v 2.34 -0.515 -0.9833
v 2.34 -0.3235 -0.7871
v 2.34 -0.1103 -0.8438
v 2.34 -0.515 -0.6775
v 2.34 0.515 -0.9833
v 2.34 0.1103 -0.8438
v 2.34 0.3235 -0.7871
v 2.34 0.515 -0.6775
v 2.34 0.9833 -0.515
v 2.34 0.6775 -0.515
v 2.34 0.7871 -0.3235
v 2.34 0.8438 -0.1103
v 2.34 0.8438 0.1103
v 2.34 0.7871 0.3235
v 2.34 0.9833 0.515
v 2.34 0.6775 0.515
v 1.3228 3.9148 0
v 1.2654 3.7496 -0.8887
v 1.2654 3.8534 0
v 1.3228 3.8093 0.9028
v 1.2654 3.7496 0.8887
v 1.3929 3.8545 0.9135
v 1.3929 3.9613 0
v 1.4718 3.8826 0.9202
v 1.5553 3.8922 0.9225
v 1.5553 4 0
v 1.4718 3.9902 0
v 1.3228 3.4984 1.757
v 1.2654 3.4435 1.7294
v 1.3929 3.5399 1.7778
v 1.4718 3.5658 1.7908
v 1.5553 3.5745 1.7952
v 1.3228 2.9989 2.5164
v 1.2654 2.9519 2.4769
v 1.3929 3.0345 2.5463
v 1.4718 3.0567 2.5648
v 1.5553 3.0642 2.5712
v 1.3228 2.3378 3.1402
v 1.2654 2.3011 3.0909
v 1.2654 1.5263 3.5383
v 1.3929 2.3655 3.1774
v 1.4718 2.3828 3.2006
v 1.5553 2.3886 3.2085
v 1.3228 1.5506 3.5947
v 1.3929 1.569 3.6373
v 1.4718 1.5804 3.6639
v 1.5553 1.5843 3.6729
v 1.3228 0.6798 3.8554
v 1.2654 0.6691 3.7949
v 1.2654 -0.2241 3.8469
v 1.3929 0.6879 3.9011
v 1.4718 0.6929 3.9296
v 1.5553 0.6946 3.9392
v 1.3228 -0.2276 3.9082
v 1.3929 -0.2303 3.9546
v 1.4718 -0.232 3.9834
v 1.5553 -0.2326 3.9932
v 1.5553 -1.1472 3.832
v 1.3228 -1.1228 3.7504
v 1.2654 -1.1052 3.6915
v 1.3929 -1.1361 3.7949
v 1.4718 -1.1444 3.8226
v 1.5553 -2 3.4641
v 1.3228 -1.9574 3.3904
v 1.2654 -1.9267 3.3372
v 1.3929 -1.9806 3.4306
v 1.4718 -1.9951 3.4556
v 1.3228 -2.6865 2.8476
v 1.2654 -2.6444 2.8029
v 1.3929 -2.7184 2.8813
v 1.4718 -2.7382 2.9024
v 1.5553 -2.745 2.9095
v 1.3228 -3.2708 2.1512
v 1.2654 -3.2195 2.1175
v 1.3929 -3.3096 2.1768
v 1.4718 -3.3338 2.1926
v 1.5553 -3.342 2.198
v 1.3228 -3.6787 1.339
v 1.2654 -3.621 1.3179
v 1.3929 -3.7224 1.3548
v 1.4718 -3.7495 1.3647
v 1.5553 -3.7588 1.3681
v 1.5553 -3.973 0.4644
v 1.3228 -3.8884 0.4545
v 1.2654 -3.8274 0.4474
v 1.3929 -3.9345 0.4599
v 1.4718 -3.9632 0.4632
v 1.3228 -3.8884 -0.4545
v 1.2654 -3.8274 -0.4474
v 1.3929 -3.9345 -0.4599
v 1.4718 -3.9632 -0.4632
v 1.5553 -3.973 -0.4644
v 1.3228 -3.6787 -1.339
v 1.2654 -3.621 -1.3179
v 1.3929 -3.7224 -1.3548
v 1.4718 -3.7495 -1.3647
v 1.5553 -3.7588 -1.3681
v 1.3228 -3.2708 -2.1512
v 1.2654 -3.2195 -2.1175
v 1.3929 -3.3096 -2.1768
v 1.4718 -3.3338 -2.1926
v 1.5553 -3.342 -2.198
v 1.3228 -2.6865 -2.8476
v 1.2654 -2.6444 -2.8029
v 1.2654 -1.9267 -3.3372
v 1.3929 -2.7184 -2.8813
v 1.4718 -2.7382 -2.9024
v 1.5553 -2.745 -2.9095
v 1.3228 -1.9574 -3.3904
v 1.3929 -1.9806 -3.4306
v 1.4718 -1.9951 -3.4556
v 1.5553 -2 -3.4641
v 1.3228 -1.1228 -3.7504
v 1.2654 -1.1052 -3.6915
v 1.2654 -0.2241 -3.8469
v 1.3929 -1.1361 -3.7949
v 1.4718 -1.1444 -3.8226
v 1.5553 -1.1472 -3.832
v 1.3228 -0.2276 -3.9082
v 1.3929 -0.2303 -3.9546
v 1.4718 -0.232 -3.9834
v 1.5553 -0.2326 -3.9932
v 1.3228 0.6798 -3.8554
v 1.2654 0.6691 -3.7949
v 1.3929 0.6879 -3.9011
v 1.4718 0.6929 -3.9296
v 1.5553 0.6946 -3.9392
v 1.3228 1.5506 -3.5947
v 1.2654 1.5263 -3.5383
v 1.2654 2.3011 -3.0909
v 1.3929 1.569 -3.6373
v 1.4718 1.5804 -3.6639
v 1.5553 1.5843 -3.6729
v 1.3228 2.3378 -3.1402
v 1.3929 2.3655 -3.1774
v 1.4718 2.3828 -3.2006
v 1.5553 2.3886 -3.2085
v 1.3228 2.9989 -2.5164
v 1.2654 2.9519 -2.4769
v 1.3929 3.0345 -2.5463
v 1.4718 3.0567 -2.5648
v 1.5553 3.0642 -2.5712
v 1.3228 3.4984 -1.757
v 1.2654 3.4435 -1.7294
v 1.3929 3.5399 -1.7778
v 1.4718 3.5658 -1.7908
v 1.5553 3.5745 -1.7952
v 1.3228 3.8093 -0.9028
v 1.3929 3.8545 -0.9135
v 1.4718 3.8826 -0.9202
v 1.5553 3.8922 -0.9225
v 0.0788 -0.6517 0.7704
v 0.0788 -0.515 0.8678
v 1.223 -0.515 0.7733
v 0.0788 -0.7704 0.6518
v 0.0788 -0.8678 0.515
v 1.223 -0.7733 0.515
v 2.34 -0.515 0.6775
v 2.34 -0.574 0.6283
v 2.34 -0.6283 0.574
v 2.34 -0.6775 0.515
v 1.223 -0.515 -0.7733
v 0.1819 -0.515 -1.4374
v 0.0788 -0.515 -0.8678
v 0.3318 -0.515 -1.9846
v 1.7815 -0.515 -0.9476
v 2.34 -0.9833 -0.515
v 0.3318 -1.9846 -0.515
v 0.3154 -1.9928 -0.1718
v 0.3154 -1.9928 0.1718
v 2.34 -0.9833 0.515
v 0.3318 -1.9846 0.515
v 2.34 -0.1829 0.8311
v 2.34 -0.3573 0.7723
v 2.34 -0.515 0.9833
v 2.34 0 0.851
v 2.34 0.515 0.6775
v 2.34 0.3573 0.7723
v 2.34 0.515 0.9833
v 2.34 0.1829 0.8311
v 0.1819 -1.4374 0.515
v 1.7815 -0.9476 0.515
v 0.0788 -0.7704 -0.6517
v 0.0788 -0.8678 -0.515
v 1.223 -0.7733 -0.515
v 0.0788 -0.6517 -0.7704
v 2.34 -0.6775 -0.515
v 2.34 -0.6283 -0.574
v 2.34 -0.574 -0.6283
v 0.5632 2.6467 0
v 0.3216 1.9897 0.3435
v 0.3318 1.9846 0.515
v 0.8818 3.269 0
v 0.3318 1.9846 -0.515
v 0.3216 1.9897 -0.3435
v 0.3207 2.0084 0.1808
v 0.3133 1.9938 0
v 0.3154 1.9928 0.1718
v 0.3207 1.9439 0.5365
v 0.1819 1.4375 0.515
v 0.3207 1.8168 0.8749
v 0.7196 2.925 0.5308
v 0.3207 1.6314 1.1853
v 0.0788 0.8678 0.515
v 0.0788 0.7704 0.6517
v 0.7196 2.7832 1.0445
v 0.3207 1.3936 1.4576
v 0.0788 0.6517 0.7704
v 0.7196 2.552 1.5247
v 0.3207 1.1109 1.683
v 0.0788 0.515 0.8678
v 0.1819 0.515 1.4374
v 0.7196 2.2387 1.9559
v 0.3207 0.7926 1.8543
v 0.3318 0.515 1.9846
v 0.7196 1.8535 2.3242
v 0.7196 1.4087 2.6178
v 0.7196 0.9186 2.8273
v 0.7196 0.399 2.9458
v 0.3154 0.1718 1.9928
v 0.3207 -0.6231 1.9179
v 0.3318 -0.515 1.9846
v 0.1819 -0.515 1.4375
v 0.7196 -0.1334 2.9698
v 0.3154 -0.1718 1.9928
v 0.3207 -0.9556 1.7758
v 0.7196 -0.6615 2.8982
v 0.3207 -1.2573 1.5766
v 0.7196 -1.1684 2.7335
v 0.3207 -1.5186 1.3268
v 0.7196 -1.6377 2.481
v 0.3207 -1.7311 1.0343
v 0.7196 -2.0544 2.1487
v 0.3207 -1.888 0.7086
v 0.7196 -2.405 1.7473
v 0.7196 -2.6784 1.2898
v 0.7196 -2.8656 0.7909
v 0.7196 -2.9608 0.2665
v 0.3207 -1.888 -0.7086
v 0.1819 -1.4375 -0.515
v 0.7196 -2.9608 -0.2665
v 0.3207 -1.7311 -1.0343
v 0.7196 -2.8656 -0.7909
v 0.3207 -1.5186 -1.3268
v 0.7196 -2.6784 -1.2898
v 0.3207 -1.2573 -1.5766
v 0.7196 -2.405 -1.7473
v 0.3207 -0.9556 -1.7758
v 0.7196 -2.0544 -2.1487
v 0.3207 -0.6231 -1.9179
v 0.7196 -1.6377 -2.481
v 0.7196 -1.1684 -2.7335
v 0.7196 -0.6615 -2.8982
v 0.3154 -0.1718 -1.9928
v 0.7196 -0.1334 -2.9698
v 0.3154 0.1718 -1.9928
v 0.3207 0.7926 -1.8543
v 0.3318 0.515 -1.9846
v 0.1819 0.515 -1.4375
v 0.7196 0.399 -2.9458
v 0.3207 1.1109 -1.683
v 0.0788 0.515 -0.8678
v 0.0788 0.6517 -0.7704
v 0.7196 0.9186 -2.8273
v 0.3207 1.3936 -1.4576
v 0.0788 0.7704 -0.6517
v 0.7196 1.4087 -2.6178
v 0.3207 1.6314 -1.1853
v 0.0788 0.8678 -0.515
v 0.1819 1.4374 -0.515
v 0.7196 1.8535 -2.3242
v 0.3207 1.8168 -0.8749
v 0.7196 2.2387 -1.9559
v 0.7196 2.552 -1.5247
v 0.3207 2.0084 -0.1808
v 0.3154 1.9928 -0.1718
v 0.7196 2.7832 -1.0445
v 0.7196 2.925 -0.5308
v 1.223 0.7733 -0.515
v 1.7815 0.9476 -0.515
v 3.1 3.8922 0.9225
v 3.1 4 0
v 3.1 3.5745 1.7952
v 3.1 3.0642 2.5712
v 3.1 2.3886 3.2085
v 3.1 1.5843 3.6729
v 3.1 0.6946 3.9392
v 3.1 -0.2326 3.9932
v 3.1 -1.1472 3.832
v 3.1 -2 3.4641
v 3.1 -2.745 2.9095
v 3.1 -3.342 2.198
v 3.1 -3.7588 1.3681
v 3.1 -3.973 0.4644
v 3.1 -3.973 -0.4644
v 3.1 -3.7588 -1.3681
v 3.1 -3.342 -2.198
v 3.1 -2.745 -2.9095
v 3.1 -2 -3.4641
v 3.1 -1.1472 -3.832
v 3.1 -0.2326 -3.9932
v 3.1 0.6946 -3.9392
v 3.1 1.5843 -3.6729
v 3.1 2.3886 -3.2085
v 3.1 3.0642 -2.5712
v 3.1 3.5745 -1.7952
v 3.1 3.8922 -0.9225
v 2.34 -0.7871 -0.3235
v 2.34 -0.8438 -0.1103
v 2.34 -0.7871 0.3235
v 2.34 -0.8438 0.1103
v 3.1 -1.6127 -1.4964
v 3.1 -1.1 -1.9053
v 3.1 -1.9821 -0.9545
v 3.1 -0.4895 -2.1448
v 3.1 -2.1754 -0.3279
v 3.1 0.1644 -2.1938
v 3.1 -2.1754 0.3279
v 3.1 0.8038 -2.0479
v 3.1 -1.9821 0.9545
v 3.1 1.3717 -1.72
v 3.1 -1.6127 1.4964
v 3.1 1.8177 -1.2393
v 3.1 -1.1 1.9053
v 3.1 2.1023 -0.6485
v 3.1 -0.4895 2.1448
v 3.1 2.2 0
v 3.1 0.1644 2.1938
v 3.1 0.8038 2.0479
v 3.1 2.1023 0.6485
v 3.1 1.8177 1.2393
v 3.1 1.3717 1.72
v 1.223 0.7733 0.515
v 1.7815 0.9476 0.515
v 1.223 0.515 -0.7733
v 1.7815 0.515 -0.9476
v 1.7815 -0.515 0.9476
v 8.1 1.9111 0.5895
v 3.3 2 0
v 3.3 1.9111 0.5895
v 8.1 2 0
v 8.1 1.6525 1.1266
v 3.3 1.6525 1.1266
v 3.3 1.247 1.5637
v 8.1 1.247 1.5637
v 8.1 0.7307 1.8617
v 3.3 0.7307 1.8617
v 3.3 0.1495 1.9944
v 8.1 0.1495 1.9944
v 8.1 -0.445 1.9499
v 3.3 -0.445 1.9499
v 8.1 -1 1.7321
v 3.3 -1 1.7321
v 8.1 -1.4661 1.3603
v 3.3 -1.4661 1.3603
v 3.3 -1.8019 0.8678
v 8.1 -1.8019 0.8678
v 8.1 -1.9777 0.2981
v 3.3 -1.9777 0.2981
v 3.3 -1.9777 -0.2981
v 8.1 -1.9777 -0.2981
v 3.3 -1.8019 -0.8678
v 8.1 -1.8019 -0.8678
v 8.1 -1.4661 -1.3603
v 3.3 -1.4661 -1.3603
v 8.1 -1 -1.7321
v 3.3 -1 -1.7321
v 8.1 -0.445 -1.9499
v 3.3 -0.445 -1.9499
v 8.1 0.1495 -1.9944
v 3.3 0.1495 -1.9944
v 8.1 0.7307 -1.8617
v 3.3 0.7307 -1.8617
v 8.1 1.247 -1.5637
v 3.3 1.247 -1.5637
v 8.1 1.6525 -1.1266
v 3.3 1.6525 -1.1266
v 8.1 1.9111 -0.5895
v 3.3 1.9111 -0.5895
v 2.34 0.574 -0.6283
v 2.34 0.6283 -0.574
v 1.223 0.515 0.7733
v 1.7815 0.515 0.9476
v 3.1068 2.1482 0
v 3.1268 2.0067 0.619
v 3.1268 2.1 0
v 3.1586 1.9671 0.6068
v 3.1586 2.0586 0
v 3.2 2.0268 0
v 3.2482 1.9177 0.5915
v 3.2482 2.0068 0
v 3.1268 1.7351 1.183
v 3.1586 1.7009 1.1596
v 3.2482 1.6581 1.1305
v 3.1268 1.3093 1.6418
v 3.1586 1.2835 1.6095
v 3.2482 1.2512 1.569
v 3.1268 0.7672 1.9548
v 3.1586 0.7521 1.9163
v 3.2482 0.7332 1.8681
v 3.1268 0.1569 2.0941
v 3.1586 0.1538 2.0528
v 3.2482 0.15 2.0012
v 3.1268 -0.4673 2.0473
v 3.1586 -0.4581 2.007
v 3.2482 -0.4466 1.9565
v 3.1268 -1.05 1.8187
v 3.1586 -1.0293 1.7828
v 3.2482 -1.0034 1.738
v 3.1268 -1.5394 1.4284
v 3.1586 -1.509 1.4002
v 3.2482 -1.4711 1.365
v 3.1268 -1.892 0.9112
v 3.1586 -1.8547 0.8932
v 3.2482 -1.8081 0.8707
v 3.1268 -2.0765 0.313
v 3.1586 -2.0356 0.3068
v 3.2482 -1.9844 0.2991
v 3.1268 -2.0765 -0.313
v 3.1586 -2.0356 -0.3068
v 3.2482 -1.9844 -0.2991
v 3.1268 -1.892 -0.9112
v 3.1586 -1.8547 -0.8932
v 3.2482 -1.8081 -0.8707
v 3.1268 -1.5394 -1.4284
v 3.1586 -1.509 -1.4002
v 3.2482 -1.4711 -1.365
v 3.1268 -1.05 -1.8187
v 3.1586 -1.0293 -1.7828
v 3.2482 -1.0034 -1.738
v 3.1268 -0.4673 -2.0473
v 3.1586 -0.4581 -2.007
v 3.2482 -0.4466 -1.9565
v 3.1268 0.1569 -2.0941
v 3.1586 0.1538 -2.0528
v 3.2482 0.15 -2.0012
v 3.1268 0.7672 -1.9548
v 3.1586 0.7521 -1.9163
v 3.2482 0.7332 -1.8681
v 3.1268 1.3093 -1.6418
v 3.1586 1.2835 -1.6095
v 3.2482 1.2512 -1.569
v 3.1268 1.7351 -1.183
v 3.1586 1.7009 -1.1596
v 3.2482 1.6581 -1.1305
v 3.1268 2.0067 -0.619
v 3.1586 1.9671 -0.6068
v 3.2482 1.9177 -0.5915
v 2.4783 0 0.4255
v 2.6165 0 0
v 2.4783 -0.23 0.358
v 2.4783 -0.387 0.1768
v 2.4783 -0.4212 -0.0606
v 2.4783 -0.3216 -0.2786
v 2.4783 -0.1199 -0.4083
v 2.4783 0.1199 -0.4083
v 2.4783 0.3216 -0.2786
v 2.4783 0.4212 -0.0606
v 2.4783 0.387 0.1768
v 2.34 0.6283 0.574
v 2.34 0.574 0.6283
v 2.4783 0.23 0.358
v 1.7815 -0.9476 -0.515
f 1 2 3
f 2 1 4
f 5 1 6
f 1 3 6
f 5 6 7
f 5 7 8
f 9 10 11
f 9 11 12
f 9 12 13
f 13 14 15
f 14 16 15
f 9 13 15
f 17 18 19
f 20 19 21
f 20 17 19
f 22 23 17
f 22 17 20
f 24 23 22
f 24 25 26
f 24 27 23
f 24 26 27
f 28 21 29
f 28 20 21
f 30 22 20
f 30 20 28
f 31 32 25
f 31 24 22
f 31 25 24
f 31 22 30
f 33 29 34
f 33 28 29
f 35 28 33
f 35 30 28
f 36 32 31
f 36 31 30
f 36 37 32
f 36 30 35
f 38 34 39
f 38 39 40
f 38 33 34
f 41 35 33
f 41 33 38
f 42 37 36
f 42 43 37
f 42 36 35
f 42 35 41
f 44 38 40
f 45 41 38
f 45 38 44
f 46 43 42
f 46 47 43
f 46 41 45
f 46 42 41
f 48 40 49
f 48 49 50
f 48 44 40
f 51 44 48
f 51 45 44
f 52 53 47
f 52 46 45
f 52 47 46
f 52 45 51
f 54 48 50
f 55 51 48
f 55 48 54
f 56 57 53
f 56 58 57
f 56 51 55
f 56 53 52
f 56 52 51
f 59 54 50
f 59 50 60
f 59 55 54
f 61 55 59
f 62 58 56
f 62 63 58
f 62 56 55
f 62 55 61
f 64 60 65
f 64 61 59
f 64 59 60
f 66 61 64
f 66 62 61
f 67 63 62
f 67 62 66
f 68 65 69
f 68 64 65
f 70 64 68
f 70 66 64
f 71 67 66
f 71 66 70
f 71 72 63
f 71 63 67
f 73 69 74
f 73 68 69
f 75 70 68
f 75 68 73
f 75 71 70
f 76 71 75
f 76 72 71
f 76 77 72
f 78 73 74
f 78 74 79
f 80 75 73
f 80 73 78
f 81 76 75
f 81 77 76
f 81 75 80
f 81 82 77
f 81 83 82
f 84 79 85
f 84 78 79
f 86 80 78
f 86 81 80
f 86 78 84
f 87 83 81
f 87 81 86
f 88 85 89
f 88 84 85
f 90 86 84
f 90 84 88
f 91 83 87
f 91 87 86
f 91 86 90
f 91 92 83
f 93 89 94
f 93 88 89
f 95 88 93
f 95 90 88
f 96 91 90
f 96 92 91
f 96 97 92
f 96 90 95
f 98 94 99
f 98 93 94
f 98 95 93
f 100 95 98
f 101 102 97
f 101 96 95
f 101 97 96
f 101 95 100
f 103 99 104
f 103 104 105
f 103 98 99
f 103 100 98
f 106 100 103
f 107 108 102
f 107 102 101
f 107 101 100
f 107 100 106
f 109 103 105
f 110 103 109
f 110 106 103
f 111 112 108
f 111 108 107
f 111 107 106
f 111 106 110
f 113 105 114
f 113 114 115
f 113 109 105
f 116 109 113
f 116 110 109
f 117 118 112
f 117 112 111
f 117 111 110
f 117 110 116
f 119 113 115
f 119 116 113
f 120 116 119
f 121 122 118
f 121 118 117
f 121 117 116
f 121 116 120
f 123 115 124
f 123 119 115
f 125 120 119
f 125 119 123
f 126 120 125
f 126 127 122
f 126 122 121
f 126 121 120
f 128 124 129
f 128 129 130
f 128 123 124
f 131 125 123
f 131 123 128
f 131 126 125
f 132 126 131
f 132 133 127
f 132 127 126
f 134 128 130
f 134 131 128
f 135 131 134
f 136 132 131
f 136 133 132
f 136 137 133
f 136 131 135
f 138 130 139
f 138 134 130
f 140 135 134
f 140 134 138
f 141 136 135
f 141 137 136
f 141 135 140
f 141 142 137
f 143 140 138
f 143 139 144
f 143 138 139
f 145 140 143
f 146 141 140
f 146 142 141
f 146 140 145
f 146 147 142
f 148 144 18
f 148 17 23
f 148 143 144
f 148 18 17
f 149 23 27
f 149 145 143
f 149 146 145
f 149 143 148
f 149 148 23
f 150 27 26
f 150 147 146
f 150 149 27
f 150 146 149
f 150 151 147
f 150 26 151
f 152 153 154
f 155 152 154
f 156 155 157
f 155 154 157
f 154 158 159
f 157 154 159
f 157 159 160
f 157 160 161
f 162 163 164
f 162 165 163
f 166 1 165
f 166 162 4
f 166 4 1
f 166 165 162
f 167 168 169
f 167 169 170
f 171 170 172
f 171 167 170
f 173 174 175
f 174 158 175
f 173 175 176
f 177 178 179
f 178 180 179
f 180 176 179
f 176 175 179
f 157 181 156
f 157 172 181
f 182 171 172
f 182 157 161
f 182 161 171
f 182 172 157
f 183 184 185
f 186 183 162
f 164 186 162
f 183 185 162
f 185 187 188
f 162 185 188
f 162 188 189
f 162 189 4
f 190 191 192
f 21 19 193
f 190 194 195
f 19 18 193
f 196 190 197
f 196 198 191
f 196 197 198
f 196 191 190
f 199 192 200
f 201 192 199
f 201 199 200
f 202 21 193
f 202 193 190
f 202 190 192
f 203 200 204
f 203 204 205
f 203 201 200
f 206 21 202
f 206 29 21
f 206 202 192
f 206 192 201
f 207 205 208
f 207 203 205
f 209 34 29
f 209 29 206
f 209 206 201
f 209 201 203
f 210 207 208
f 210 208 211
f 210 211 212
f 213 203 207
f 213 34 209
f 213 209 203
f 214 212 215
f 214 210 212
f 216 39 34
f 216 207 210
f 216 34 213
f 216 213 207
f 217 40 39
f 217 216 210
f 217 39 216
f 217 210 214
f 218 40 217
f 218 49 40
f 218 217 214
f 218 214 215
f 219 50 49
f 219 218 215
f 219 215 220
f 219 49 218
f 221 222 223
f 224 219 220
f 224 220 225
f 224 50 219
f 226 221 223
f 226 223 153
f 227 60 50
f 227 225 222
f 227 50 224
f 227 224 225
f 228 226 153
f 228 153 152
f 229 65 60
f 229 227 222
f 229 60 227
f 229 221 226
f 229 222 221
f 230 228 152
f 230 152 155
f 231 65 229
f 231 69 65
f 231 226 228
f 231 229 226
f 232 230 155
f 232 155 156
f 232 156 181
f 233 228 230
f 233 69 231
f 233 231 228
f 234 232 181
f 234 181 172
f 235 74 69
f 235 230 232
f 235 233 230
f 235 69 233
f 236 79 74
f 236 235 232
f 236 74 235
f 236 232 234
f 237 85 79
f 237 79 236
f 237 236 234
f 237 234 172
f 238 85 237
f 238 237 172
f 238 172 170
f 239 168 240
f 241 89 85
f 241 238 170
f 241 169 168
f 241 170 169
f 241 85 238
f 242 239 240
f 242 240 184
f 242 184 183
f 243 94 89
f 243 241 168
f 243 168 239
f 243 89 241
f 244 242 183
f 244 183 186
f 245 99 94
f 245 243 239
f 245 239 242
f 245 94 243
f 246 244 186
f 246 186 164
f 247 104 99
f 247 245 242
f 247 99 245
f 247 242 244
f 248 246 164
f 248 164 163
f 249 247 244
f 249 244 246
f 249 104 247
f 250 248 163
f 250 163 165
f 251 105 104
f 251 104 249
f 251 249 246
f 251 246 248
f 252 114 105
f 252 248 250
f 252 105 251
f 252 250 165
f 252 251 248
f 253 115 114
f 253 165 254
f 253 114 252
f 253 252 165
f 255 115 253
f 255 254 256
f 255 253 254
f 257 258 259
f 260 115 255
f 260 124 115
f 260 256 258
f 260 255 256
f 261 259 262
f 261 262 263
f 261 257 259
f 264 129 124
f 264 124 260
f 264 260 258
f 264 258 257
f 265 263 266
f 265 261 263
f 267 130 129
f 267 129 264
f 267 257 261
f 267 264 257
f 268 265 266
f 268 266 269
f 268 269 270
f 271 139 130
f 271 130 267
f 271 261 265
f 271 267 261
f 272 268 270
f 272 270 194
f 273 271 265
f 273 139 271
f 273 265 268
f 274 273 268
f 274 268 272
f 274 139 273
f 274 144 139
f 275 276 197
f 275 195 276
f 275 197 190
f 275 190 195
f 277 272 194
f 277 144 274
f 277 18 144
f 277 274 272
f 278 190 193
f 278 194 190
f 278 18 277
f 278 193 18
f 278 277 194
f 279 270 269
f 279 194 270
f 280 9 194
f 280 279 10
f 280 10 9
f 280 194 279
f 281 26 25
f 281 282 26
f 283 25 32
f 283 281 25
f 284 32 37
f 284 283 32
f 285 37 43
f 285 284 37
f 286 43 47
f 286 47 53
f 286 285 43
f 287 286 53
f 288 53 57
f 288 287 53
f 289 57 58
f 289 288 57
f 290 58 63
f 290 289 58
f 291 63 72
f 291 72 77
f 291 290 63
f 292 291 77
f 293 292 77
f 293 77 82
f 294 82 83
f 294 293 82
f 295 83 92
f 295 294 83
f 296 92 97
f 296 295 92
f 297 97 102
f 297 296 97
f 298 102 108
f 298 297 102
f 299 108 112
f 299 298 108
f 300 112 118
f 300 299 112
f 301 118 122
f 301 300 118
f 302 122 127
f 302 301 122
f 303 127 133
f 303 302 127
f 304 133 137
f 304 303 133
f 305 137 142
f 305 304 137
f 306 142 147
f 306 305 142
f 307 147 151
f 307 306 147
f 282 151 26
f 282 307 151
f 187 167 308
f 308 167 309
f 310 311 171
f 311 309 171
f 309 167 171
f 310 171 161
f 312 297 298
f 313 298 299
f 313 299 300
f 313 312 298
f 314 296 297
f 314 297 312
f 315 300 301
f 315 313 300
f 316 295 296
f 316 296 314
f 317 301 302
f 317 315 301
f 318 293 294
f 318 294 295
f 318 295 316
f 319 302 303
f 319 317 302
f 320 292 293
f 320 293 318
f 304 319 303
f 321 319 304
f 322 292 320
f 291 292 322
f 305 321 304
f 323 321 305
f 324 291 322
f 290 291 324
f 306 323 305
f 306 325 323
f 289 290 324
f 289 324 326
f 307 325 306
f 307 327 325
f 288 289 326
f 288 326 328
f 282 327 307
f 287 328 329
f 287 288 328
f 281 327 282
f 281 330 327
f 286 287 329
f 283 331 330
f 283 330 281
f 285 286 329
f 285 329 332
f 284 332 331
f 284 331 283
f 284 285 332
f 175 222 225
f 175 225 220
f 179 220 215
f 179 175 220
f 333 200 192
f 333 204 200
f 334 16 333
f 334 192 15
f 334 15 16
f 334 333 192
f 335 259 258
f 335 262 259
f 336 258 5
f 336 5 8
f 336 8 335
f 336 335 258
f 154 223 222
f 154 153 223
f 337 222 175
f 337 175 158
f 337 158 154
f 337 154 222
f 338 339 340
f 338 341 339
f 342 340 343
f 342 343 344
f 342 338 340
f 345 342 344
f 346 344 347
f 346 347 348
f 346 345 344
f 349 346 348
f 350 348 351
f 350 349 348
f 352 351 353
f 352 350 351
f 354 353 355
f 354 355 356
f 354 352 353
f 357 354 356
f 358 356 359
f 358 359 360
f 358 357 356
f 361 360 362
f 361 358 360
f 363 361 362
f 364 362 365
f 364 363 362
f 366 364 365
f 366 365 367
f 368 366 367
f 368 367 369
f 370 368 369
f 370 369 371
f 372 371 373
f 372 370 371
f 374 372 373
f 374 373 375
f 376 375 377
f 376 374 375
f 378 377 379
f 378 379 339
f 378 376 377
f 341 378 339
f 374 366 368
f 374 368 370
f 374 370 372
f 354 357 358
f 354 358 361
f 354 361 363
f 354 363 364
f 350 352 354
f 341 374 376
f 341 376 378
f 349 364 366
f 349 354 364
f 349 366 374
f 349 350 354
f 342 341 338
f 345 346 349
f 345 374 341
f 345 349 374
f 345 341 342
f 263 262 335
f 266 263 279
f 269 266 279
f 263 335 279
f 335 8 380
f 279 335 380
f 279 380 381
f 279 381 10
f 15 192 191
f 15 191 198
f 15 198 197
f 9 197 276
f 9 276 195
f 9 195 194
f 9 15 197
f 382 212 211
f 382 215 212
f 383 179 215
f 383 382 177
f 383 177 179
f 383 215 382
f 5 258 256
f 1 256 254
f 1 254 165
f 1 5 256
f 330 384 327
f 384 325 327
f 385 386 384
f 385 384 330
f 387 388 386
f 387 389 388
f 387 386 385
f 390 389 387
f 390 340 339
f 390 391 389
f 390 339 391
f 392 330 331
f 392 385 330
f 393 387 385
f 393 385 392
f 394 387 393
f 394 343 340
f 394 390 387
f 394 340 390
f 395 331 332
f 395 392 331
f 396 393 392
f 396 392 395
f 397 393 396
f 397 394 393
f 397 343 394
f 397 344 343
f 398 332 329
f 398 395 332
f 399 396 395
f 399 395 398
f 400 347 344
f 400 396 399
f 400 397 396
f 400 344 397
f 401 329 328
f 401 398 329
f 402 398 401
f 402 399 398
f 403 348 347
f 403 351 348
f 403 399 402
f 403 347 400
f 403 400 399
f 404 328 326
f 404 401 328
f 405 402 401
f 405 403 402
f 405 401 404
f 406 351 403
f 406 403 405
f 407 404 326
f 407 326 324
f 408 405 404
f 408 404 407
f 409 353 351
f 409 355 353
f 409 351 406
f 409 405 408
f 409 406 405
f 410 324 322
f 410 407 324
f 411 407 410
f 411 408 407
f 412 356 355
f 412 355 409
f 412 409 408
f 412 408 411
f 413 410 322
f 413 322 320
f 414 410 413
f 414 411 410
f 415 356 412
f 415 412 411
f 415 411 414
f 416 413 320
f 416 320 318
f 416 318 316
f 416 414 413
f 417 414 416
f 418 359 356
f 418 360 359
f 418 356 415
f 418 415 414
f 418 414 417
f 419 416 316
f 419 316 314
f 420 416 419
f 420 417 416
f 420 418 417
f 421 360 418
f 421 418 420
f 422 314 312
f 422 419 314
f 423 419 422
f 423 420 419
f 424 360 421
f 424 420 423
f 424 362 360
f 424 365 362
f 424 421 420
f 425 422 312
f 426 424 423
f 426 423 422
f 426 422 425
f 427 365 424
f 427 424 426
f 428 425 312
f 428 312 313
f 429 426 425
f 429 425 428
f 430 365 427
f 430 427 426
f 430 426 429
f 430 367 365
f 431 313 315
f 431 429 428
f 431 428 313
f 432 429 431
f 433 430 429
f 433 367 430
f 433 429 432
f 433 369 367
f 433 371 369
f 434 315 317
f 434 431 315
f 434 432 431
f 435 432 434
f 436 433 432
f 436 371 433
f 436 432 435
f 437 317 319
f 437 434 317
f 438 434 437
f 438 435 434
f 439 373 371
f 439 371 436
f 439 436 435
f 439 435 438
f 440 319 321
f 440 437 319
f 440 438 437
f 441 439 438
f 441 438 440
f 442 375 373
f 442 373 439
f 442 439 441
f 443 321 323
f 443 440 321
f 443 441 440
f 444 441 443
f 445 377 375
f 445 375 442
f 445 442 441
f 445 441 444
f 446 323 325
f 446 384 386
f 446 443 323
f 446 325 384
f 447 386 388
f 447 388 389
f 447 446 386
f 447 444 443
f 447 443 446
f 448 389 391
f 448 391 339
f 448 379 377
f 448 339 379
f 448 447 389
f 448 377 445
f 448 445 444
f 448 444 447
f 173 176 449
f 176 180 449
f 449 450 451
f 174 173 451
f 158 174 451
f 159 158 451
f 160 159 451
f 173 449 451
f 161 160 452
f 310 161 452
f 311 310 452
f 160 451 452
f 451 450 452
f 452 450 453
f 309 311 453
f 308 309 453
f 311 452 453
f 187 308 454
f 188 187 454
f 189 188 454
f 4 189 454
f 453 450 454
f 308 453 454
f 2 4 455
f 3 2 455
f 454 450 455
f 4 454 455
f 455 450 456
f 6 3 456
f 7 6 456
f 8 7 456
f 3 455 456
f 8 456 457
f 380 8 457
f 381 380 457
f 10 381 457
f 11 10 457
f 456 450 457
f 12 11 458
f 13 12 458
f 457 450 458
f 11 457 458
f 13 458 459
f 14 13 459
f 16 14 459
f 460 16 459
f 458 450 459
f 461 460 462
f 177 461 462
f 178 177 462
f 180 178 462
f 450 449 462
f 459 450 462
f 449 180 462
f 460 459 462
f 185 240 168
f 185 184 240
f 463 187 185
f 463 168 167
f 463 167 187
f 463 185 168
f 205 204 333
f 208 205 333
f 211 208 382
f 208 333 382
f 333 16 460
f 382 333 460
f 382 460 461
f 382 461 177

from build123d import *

# Parameters (mm, degrees)
RECPAT_COUNT = 2
RECPAT_ANGLE = 90


with BuildPart() as part:
    # Fillet1: read off the stored shape, not the designer's step
    # Fillet1 outline → Fillet1 (revolve)
    with BuildSketch(Plane.YX):
        with BuildLine():
            Line((2, 3.3), (2, 8.1))
            Line((2, 8.1), (0, 8.1))
            Line((0, 8.1), (0, 0))
            ThreePointArc((0, 0), (2.027933458, 0.324444488), (3.853420198, 1.265388956))
            ThreePointArc((3.853420198, 1.265388956), (3.961271902, 1.392873227), (4, 1.555305874))
            Line((4, 1.555305874), (4, 3.1))
            Line((4, 3.1), (2.2, 3.1))
            ThreePointArc((2.2, 3.1), (2.058578644, 3.158578644), (2, 3.3))
        make_face()
    revolve(axis=Axis((0, 0, 0), (1, 0, 0)))

    # Sketch3 → Recess section 0
    with BuildSketch(Plane(origin=(0, 0, 0), x_dir=(0, 0, -1), z_dir=(1, 0, 0))):
        with BuildLine():
            Line((0.515, -2.15), (-0.515, -2.15))
            Line((-0.515, -2.15), (-0.515, 2.15))
            Line((-0.515, 2.15), (0.515, 2.15))
            Line((0.515, 2.15), (0.515, -2.15))
        make_face()
    # Sketch4 → Recess section 1
    with BuildSketch(Plane(origin=(2.34, 0, 0), x_dir=(0, 0, -1), z_dir=(1, 0, 0))):
        with BuildLine():
            Line((0.515, -0.983319232), (-0.515, -0.983319232))
            Line((-0.515, -0.983319232), (-0.515, 0.983319232))
            Line((-0.515, 0.983319232), (0.515, 0.983319232))
            Line((0.515, 0.983319232), (0.515, -0.983319232))
        make_face()
    recess = loft(mode=Mode.SUBTRACT)

    # RecPat: Recess ×2 about axis
    recpat_axis = Axis((0, 0, 0), (1, 0, 0))
    for i in range(1, RECPAT_COUNT):
        add(recess.rotate(recpat_axis, i * RECPAT_ANGLE / (RECPAT_COUNT - 1)), mode=Mode.SUBTRACT)

    # RecCorSke → RecessCore (revolve, cut)
    with BuildSketch(Plane.XY, mode=Mode.PRIVATE) as recesscore_sk:
        Polygon((0, 0), (0, 1.01462874), (2.34, 0.851), (2.616506661, 0), align=None)
    revolve(recesscore_sk.sketch.rotate(Axis((-3.175, 0, 0), (1, 0, 0)), 90), axis=Axis((-3.175, 0, 0), (1, 0, 0)), mode=Mode.SUBTRACT)


solid = part.part
